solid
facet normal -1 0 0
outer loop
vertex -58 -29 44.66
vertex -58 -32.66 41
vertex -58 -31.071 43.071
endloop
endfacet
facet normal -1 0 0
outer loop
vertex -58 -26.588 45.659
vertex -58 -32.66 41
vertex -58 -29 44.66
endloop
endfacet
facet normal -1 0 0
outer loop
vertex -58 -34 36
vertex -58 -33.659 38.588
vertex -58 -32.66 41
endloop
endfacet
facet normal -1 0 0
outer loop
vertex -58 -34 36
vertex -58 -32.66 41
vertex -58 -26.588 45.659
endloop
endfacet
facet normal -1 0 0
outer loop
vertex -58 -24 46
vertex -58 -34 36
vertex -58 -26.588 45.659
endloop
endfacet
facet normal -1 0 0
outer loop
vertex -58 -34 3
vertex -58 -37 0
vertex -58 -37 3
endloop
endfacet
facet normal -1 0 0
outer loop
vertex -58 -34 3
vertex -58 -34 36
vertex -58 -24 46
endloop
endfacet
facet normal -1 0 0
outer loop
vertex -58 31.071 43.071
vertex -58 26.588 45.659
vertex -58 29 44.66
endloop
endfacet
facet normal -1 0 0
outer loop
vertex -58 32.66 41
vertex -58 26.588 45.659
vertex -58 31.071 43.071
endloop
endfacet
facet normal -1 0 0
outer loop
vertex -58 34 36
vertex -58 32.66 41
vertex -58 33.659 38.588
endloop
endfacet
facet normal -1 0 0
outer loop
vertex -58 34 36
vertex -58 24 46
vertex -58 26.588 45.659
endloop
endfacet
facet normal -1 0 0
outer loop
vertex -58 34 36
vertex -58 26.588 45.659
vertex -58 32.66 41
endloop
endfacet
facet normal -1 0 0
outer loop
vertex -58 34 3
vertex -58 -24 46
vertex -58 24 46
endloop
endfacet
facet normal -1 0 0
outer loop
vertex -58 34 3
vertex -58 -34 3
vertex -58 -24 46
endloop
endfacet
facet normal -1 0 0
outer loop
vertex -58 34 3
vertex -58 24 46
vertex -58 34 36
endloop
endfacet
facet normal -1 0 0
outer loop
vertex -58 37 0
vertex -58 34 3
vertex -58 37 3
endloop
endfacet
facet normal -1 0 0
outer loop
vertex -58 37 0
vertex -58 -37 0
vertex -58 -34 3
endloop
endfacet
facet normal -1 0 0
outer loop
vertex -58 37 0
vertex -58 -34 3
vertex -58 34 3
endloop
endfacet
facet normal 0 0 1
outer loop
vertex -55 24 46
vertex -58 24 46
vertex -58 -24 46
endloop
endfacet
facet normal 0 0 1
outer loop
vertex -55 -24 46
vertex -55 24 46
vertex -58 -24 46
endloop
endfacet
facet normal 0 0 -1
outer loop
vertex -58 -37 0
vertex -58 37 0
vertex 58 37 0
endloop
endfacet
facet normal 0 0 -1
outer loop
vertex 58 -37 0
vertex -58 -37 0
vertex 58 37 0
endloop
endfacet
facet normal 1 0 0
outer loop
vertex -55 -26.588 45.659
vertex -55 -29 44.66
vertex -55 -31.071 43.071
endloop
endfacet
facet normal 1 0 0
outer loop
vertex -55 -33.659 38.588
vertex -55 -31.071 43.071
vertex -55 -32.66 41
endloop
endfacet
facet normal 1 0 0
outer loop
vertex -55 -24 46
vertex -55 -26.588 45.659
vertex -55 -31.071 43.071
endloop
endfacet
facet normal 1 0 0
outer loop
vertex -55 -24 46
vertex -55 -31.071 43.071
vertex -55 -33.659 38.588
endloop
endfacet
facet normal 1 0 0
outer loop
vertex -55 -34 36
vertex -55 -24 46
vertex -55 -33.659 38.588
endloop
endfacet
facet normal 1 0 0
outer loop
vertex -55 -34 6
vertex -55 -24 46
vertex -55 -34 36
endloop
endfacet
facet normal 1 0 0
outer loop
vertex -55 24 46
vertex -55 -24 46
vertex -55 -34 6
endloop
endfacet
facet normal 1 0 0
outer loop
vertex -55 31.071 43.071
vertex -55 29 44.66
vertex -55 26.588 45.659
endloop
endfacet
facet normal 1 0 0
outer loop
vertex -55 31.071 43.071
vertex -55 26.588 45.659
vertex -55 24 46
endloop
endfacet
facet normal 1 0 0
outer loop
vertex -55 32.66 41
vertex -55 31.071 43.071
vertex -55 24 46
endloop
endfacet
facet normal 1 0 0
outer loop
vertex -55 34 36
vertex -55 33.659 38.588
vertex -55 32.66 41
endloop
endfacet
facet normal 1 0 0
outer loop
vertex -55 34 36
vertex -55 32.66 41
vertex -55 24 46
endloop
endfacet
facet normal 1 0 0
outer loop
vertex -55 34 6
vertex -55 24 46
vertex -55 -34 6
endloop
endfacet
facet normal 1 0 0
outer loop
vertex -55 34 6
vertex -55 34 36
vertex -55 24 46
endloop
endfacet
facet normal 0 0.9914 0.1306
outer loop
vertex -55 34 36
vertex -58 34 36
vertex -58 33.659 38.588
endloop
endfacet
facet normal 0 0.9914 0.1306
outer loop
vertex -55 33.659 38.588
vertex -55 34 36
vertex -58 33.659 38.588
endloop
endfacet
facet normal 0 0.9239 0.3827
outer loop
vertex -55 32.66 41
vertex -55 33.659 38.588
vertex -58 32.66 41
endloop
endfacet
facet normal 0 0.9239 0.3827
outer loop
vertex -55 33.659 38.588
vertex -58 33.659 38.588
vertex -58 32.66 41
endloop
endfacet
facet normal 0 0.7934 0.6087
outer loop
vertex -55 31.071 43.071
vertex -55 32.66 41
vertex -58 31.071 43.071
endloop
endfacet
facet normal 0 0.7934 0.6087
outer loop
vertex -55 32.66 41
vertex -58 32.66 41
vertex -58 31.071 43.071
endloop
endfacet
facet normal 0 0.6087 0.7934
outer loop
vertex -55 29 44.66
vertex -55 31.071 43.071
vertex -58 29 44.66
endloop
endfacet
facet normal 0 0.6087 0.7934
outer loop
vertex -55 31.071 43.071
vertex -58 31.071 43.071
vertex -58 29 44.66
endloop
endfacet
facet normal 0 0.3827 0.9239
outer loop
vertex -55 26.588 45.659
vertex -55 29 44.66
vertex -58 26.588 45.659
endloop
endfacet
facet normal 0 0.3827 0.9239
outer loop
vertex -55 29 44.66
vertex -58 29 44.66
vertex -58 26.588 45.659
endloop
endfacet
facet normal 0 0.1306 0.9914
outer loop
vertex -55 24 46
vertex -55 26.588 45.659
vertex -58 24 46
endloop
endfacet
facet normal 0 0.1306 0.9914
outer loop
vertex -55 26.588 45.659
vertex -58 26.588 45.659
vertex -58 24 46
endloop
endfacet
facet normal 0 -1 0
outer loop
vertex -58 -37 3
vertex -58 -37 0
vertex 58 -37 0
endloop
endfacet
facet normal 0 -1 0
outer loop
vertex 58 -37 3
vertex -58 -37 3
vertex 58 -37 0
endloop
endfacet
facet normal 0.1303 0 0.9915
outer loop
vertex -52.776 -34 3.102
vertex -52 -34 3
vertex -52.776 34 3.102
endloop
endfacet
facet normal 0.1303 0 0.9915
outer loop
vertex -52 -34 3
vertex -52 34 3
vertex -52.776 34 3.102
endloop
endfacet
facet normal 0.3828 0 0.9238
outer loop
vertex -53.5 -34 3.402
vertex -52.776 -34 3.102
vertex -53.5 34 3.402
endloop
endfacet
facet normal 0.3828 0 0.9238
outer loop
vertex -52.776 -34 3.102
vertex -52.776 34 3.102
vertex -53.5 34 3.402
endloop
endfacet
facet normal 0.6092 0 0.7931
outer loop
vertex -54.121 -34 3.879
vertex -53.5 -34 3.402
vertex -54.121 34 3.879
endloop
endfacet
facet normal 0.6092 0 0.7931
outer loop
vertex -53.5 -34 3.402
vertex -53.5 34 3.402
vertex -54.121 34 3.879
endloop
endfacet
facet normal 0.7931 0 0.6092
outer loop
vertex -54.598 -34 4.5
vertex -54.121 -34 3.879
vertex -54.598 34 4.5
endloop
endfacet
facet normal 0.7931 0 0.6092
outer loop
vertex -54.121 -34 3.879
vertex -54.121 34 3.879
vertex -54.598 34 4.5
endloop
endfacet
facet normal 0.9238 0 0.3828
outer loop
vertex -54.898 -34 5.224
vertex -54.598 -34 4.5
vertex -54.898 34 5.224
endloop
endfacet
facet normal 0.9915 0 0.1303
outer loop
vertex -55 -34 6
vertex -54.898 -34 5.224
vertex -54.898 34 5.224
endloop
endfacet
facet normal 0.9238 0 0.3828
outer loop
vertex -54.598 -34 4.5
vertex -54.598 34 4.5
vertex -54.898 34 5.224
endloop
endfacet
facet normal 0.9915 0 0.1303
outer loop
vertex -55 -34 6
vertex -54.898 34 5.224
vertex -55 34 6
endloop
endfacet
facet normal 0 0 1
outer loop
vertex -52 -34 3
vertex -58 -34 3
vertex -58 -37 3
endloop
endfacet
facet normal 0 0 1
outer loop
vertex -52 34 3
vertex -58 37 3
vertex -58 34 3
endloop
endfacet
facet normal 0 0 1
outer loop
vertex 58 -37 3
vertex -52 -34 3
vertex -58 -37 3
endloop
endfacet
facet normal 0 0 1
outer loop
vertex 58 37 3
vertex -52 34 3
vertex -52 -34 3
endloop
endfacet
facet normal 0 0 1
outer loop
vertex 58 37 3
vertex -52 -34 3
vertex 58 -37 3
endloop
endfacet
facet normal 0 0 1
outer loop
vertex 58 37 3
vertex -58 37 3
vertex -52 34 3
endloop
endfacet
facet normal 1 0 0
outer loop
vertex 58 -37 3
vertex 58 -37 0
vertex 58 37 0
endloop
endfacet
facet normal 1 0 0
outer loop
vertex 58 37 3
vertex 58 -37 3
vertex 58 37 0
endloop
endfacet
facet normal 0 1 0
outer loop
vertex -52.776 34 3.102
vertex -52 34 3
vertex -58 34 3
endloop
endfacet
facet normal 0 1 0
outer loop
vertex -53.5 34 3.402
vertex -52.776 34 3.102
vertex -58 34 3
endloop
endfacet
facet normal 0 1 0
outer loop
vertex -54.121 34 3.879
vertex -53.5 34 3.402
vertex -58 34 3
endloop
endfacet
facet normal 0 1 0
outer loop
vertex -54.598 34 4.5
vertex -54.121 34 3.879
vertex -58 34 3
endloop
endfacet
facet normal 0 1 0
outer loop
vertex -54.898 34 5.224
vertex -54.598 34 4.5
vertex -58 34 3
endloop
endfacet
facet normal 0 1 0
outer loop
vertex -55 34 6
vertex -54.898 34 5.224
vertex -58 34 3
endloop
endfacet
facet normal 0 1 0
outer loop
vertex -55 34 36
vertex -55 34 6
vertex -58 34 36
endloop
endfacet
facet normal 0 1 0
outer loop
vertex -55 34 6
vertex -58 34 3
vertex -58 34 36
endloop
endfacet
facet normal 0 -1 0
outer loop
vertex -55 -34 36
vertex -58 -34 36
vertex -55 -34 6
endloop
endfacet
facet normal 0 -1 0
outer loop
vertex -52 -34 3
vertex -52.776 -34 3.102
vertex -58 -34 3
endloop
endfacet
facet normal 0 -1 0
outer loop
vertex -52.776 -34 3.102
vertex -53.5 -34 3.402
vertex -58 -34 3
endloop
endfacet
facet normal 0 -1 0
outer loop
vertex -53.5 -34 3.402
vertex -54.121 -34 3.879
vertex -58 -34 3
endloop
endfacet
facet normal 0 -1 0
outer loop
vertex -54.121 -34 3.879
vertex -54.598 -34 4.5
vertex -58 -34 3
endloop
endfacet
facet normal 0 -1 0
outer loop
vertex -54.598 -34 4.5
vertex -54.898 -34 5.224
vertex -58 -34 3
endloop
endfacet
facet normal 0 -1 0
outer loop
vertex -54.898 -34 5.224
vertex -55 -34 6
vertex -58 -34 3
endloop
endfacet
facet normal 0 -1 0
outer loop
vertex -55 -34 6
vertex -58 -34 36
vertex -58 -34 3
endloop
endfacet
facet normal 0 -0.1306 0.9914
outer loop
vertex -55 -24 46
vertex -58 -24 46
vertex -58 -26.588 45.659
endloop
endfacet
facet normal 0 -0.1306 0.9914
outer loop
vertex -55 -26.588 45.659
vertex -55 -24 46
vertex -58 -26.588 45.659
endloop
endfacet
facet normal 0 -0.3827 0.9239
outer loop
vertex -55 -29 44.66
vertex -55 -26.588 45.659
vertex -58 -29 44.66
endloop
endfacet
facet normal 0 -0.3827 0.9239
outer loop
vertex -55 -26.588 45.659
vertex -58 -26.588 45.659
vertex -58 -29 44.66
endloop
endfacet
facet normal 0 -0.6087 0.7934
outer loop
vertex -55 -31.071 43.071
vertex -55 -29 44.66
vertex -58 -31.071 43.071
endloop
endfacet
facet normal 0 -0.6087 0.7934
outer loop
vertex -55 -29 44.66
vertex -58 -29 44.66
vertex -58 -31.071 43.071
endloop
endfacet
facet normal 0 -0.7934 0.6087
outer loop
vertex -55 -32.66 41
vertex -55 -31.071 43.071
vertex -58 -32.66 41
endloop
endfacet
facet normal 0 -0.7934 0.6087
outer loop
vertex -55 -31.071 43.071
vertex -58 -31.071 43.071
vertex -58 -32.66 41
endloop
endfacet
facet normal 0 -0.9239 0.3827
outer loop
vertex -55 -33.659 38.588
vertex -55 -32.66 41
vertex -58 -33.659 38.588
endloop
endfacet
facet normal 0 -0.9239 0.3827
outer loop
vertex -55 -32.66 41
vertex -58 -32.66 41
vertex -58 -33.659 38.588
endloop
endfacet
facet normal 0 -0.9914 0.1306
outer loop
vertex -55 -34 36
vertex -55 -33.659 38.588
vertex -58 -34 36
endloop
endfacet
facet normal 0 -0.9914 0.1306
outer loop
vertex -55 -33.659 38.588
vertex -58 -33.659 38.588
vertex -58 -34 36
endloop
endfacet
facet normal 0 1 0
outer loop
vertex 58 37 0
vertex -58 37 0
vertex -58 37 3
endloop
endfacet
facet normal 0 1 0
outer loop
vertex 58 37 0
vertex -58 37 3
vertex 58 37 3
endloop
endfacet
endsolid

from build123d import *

# Parameters (mm, degrees)
ESBO_O1_W                = 116
ESBO_O1_H                = 74
RESSALTO_EXTRUS_O1_DEPTH = 3
RESSALTO_EXTRUS_O2_DEPTH = 3
FILETE1_R                = 3


with BuildPart() as part:
    # Esboço1 → Ressalto-extrusão1 (new body)
    with BuildSketch(Plane.XY):
        Rectangle(ESBO_O1_W, ESBO_O1_H)
    extrude(amount=RESSALTO_EXTRUS_O1_DEPTH)

    # Esboço2 → Ressalto-extrusão2 (add)
    with BuildSketch(Plane.ZY.offset(58)):
        with BuildLine():
            Line((3, 34), (36, 34))
            ThreePointArc((36, 34), (43.071067812, 31.071067812), (46, 24))
            Line((46, 24), (46, -24))
            ThreePointArc((46, -24), (43.071067812, -31.071067812), (36, -34))
            Line((36, -34), (3, -34))
            Line((3, -34), (3, 34))
        make_face()
    extrude(amount=-RESSALTO_EXTRUS_O2_DEPTH)

    # Filete1
    filete1_edges = [part.edges().sort_by_distance(p)[0] for p in [
        (-55, 0, 3),
    ]]
    fillet(filete1_edges, radius=FILETE1_R)


solid = part.part
